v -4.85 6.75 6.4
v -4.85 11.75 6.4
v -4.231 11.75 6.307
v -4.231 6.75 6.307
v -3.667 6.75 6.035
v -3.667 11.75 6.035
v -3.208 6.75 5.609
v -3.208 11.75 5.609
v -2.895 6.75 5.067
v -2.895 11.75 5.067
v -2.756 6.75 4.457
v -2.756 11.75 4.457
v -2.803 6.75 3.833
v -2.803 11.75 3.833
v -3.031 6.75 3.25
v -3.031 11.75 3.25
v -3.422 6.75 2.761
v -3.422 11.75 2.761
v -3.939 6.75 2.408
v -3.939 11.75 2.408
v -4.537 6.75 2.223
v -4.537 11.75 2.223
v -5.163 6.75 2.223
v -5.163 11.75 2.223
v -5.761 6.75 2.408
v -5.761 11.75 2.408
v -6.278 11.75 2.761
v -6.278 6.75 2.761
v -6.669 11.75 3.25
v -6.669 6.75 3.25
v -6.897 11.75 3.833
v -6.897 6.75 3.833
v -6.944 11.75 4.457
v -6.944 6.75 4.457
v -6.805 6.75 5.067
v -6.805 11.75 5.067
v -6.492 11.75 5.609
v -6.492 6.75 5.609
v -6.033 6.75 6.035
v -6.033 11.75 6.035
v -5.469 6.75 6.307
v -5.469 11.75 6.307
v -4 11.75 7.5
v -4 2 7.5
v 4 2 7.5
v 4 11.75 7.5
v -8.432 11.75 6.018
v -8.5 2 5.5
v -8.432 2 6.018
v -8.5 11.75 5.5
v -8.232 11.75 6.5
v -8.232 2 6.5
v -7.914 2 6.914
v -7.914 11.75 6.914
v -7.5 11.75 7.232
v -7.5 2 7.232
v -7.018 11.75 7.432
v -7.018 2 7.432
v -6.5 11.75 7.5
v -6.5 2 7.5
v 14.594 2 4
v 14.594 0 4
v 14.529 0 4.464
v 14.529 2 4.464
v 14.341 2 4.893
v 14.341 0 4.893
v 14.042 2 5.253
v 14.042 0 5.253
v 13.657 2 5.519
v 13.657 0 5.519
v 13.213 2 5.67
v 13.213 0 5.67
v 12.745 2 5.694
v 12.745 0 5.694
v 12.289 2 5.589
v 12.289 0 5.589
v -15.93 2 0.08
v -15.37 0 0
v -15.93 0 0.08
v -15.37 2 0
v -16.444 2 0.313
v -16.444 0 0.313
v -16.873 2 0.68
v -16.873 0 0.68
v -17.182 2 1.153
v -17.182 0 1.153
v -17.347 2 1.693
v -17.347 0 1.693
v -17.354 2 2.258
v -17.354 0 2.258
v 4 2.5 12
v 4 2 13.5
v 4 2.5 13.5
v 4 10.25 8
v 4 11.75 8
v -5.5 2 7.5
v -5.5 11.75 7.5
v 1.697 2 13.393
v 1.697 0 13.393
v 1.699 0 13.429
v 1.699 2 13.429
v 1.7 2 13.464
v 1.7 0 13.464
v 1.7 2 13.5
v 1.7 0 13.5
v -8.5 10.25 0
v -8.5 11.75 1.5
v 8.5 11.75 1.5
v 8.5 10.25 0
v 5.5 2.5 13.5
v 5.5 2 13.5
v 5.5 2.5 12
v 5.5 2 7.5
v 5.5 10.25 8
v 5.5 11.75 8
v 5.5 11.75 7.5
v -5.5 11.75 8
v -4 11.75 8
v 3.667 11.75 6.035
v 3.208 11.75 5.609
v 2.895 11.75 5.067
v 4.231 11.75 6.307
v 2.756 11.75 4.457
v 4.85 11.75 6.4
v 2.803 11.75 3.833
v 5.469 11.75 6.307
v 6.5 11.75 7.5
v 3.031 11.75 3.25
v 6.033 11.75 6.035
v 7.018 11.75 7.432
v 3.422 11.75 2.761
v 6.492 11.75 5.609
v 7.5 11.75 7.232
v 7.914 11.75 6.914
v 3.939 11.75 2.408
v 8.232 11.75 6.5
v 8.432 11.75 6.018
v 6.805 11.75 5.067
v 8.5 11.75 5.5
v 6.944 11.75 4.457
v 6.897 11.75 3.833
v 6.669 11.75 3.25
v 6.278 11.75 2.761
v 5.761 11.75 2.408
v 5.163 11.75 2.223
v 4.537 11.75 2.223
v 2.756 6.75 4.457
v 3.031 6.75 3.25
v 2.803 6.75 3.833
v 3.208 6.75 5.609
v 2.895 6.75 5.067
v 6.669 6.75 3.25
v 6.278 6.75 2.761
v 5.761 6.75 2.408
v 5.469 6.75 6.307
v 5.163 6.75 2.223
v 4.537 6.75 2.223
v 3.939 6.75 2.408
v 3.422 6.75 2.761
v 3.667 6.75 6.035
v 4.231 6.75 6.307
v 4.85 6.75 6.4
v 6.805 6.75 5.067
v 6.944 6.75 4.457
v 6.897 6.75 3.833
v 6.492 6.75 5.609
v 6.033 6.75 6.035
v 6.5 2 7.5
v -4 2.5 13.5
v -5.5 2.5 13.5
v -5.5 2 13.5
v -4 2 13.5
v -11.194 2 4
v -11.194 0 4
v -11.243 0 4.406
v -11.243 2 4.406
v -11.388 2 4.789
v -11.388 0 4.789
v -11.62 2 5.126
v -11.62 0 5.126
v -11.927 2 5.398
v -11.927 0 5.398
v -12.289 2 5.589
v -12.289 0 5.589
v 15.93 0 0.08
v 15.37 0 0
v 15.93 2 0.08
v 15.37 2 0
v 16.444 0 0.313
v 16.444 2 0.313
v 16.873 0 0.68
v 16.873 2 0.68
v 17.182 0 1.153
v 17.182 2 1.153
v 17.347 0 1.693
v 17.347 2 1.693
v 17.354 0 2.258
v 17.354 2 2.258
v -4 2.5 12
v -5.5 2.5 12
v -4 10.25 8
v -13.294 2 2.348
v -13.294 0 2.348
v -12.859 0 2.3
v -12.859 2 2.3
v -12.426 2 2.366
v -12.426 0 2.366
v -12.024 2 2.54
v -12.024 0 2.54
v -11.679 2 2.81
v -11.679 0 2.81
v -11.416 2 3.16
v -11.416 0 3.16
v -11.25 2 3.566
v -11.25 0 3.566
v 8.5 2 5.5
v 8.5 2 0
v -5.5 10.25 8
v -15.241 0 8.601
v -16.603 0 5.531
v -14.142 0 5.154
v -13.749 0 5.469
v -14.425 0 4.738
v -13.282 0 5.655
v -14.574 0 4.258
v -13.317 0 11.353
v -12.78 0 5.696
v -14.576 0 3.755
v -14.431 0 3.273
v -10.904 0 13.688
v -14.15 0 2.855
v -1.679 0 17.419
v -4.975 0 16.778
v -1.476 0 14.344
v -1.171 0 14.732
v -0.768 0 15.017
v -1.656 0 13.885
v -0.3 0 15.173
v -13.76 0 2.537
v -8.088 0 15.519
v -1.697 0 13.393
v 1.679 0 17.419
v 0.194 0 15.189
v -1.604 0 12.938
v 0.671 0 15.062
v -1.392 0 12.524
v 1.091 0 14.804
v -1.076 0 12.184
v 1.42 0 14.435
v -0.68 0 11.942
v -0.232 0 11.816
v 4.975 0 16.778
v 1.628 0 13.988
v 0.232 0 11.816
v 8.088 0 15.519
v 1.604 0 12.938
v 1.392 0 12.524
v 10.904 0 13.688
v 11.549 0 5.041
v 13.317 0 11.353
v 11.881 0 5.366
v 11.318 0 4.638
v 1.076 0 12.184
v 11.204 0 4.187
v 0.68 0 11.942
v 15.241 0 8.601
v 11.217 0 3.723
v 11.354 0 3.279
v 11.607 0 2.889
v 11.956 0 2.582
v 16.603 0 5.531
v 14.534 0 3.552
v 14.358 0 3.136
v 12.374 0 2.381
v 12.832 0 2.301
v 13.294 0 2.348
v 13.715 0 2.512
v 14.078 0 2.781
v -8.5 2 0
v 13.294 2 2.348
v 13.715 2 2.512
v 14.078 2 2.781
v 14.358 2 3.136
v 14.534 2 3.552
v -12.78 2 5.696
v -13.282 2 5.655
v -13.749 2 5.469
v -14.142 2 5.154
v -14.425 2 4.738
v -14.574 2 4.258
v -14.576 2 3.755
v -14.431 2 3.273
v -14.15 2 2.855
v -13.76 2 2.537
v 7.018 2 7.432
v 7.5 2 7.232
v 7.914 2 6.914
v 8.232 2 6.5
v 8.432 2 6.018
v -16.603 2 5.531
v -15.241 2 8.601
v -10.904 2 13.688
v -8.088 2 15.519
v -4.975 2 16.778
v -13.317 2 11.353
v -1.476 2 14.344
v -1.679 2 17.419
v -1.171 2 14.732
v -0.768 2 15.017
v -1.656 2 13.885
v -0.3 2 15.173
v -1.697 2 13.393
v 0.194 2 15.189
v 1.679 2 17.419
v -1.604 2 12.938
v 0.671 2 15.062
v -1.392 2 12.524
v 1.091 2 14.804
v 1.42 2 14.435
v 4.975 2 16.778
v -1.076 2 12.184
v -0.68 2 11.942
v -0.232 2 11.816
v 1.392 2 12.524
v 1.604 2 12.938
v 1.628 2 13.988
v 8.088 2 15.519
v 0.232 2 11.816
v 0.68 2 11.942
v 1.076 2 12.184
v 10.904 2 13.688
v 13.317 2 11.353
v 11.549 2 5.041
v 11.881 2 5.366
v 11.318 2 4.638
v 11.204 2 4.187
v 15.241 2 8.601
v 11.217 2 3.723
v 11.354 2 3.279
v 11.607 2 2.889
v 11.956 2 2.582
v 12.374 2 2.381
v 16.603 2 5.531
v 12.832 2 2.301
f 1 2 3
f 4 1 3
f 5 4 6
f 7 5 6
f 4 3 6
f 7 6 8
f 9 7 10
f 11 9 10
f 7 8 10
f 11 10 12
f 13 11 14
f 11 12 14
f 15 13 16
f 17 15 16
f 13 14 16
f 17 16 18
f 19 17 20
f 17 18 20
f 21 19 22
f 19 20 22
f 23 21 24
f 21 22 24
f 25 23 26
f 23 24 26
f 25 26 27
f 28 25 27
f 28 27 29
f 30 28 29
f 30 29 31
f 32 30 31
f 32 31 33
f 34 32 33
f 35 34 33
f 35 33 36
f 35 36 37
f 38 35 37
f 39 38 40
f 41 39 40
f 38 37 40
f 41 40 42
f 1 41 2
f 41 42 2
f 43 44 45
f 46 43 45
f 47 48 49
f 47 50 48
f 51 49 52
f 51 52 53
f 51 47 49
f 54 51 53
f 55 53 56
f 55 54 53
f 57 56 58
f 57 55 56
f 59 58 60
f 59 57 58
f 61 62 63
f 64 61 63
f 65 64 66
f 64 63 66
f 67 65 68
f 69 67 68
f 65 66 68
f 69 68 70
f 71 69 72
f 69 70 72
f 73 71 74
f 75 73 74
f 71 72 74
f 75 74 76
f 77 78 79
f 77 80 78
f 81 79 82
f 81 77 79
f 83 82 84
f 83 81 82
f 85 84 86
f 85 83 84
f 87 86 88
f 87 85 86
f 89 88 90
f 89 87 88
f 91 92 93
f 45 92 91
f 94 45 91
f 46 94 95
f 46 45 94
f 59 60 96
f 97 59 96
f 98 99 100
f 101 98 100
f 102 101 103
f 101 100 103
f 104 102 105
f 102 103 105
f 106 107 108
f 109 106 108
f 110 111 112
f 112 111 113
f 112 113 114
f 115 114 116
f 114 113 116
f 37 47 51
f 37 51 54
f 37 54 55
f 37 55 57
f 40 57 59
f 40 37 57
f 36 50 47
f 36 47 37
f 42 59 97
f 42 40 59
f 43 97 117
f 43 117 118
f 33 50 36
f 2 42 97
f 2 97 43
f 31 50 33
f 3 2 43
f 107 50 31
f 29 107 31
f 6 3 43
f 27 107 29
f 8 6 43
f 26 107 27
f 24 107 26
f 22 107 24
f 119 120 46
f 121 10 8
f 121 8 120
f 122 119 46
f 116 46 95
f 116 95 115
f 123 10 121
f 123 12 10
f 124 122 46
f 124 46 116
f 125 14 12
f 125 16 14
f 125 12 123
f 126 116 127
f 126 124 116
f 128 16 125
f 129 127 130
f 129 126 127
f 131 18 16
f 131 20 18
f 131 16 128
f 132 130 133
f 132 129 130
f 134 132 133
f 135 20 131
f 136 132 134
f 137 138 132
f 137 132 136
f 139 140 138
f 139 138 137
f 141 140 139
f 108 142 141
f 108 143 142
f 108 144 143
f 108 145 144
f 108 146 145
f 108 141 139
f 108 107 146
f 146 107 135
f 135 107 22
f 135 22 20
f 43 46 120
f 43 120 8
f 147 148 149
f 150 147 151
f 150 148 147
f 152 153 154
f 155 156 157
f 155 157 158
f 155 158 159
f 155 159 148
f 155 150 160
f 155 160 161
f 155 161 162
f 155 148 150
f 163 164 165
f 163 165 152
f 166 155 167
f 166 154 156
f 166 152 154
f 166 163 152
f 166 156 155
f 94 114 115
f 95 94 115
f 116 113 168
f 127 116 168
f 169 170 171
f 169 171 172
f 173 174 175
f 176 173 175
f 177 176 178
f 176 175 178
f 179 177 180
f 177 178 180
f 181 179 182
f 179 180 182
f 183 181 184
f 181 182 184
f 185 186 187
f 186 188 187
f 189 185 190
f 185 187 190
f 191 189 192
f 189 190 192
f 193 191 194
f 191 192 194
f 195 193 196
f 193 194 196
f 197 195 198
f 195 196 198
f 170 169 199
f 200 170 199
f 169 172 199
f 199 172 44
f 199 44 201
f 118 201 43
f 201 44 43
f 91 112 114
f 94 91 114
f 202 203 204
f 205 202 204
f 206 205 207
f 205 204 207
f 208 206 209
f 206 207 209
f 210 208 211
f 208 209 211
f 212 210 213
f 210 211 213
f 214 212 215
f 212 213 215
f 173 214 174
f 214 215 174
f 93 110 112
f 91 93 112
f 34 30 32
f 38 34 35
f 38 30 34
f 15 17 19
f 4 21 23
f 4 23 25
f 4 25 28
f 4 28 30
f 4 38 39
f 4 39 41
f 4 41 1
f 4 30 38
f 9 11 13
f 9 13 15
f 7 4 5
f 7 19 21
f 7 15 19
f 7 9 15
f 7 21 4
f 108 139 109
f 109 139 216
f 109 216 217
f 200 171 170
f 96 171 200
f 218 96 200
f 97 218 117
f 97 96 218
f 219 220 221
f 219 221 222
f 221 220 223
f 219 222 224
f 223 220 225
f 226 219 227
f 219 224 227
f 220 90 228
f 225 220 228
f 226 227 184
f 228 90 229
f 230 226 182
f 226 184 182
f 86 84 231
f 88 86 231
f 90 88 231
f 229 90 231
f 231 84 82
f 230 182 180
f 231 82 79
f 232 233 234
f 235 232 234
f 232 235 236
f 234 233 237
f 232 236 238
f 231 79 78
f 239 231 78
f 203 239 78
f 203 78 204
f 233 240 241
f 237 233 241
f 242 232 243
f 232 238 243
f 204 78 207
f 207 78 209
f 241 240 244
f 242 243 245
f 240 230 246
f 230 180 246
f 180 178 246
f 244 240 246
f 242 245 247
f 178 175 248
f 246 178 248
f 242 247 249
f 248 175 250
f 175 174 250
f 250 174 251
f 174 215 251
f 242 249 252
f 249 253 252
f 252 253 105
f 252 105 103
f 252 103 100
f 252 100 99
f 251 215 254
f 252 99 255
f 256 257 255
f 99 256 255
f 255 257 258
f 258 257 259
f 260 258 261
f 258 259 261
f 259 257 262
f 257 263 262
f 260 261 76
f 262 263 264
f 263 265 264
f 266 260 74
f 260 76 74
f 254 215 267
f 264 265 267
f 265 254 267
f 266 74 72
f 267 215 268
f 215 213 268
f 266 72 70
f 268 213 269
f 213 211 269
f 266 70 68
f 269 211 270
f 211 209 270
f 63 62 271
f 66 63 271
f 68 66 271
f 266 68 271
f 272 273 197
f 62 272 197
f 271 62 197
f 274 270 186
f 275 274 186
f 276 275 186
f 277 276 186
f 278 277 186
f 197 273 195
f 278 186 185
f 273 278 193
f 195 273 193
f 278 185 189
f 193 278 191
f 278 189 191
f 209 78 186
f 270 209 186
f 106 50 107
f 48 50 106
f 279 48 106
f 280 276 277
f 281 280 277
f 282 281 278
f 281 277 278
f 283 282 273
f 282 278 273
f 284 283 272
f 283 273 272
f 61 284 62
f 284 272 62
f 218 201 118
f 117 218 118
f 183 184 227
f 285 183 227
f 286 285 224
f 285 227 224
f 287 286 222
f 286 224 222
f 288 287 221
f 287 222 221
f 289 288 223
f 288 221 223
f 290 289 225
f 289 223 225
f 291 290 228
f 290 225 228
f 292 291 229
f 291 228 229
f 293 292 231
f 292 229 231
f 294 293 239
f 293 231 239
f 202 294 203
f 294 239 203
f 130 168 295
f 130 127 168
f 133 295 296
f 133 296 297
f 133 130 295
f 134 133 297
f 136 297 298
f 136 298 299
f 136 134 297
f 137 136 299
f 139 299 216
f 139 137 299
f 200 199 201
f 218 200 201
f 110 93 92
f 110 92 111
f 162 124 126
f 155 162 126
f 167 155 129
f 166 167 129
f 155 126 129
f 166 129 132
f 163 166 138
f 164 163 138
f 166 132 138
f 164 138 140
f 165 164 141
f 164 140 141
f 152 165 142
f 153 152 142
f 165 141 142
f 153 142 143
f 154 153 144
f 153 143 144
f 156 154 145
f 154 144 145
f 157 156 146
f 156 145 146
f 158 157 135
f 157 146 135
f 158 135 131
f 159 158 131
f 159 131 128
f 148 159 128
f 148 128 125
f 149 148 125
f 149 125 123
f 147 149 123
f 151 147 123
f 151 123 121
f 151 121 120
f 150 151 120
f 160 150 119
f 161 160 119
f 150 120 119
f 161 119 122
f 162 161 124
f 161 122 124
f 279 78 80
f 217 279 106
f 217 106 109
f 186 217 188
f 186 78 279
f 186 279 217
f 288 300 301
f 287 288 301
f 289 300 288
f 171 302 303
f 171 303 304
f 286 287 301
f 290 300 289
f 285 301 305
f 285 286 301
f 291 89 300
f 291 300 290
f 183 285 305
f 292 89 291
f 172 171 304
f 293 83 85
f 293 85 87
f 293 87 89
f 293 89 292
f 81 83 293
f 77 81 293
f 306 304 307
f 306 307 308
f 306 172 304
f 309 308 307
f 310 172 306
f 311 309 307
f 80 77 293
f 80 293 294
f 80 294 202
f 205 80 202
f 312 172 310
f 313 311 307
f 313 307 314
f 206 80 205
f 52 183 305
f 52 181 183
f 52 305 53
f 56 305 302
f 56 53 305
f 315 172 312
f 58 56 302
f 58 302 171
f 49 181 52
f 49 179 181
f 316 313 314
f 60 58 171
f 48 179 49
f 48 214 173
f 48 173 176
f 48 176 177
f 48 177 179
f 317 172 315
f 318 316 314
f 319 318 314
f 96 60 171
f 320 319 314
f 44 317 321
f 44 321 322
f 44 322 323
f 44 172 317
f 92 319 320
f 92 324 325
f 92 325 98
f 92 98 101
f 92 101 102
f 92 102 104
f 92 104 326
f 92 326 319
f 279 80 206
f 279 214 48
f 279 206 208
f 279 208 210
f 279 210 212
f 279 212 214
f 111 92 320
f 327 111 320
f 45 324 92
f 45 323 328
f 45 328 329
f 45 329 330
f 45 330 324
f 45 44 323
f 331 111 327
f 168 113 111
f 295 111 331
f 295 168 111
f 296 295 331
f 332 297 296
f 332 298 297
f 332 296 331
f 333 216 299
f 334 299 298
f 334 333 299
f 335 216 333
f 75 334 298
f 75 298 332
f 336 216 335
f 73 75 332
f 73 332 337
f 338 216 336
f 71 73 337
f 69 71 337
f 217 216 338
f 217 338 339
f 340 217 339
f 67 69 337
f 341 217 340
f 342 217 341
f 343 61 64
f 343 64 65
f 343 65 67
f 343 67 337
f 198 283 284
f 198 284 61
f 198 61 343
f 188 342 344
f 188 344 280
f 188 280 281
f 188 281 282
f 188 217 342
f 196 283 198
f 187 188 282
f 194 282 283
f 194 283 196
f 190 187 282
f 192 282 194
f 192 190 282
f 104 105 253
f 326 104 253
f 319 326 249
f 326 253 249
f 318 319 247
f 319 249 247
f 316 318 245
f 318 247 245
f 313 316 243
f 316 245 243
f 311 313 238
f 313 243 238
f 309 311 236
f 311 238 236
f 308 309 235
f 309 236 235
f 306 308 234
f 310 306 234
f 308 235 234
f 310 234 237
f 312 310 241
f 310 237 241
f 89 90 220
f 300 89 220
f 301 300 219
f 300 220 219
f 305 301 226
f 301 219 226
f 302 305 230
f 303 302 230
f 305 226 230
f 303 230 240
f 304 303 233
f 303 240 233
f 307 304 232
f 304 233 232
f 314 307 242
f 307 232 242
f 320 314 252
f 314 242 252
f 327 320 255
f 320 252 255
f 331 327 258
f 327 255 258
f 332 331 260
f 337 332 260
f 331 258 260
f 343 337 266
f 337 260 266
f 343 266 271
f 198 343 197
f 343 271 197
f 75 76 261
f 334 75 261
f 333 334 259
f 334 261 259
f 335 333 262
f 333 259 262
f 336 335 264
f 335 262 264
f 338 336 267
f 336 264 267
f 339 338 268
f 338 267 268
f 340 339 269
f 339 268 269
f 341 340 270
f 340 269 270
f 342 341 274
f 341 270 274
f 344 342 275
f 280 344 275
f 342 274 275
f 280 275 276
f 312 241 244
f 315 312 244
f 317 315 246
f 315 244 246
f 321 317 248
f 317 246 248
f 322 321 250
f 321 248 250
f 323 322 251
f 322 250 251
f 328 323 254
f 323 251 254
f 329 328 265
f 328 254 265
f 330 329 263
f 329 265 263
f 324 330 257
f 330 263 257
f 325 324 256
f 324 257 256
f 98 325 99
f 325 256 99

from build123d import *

# Parameters (mm, degrees)
BOSS_EXTRUDE1_DEPTH = 2
SKETCH1_3_W         = 17
SKETCH1_3_H         = 7.5
SKETCH1_3_R         = 2.1
BOSS_EXTRUDE2_DEPTH = 11.75
FILLET1_R           = 2
CHAMFER1_SIZE       = 1.5
SKETCH2_W           = 1.5
SKETCH2_H           = 9.75
BOSS_EXTRUDE3_DEPTH = 6
CUT_EXTRUDE1_DEPTH  = 32.102554433
CUT_EXTRUDE2_START  = 11.75
SKETCH1_4_R         = 2.1
CUT_EXTRUDE2_DEPTH  = 5


with BuildPart() as part:
    # Sketch1 → Boss-Extrude1 (new body)
    with BuildSketch(Plane(origin=(0, 0, 0), x_dir=(1, 0, 0), z_dir=(0, 1, 0))):
        with BuildLine():
            ThreePointArc((13.294270592, -2.34784357), (13.448469299, -1.178419919), (13.5, 0))
            Line((13.5, 0), (8.5, 0))
            Line((8.5, 0), (8.5, -7.5))
            Line((8.5, -7.5), (-8.5, -7.5))
            Line((-8.5, -7.5), (-8.5, 0))
            Line((-8.5, 0), (-13.5, 0))
            ThreePointArc((-13.5, 0), (-13.448469299, -1.178419919), (-13.294270592, -2.34784357))
            ThreePointArc((-13.294270592, -2.34784357), (-11.842798665, -2.663810422), (-11.193796958, -4))
            ThreePointArc((-11.193796958, -4), (-11.494084595, -4.964782515), (-12.288862018, -5.588727075))
            ThreePointArc((-12.288862018, -5.588727075), (-8.007808689, -10.86853256), (-1.696626969, -13.392962963))
            ThreePointArc((-1.696626969, -13.392962963), (0, -11.8), (1.696626969, -13.392962963))
            ThreePointArc((1.696626969, -13.392962963), (8.007808689, -10.86853256), (12.288862018, -5.588727075))
            ThreePointArc((12.288862018, -5.588727075), (11.270133638, -3.496296296), (13.294270592, -2.34784357))
        make_face()
        with BuildLine():
            Line((17.5, 0), (13.5, 0))
            ThreePointArc((13.5, 0), (13.448469299, -1.178419919), (13.294270592, -2.34784357))
            ThreePointArc((13.294270592, -2.34784357), (14.229986536, -2.949001707), (14.593796958, -4))
            ThreePointArc((14.593796958, -4), (13.858579473, -5.399712363), (12.288862018, -5.588727075))
            ThreePointArc((12.288862018, -5.588727075), (8.007808689, -10.86853256), (1.696626969, -13.392962963))
            ThreePointArc((1.696626969, -13.392962963), (1.699156533, -13.446454915), (1.7, -13.5))
            ThreePointArc((1.7, -13.5), (-0.053545085, -15.199156533), (-1.696626969, -13.392962963))
            ThreePointArc((-1.696626969, -13.392962963), (-8.007808689, -10.86853256), (-12.288862018, -5.588727075))
            ThreePointArc((-12.288862018, -5.588727075), (-14.517460279, -4.503703704), (-13.294270592, -2.34784357))
            ThreePointArc((-13.294270592, -2.34784357), (-13.448469299, -1.178419919), (-13.5, 0))
            Line((-13.5, 0), (-17.5, 0))
            ThreePointArc((-17.5, 0), (0, -17.5), (17.5, 0))
        make_face()
    extrude(amount=BOSS_EXTRUDE1_DEPTH)

    # Sketch1<3> → Boss-Extrude2 (add)
    # profile 1 of 3: a face of its own
    with BuildSketch(Plane(origin=(0, 0, 0), x_dir=(1, 0, 0), z_dir=(0, 1, 0))):
        with Locations((0, -3.75)):
            Rectangle(SKETCH1_3_W, SKETCH1_3_H)
        with Locations((-4.85, -4.3)):
            Circle(SKETCH1_3_R, mode=Mode.SUBTRACT)
        with Locations((4.85, -4.3)):
            Circle(SKETCH1_3_R, mode=Mode.SUBTRACT)
    # profile 2 of 3: a face of its own
    with BuildSketch(Plane(origin=(0, 0, 0), x_dir=(1, 0, 0), z_dir=(0, 1, 0))):
        with Locations((-4.85, -4.3)):
            Circle(SKETCH1_3_R)
    # profile 3 of 3: a face of its own
    with BuildSketch(Plane(origin=(0, 0, 0), x_dir=(1, 0, 0), z_dir=(0, 1, 0))):
        with Locations((4.85, -4.3)):
            Circle(SKETCH1_3_R)
    extrude(amount=BOSS_EXTRUDE2_DEPTH)

    # Fillet1
    fillet1_edges = [part.edges().sort_by_distance(p)[0] for p in [
        (-17.5, 1, 0),
        (17.5, 1, 0),
        (8.5, 6.875, 7.5),
        (-8.5, 6.875, 7.5),
    ]]
    fillet(fillet1_edges, radius=FILLET1_R)

    # Chamfer1
    chamfer1_edges = [part.edges().sort_by_distance(p)[0] for p in [
        (0, 11.75, 0),
    ]]
    chamfer(chamfer1_edges, length=CHAMFER1_SIZE)

    # Sketch2 → Boss-Extrude3 (add)
    with BuildSketch(Plane.XY.offset(7.5)):
        with Locations((-4.75, 6.875)):
            Rectangle(SKETCH2_W, SKETCH2_H)
        with Locations((4.75, 6.875)):
            Rectangle(SKETCH2_W, SKETCH2_H)
    extrude(amount=BOSS_EXTRUDE3_DEPTH)

    # Sketch3 → Cut-Extrude1 (cut, through all)
    with BuildSketch(Plane(origin=(5.5, 0, 0), x_dir=(0, 0, -1), z_dir=(1, 0, 0))):
        Polygon((-8, 10.25), (-8, 11.75), (-13.5, 11.75), (-13.5, 2.5), (-12, 2.5), align=None)
    extrude(amount=-CUT_EXTRUDE1_DEPTH, mode=Mode.SUBTRACT)

    # Sketch1<4> → Cut-Extrude2 (cut)
    with BuildSketch(Plane(origin=(0, 0, 0), x_dir=(1, 0, 0), z_dir=(0, 1, 0)).offset(CUT_EXTRUDE2_START)):
        with Locations(Location((-4.85, -4.3, 0), (0, 0, 270))):
            Circle(SKETCH1_4_R)
        with Locations(Location((4.85, -4.3, 0), (0, 0, 270))):
            Circle(SKETCH1_4_R)
    extrude(amount=-CUT_EXTRUDE2_DEPTH, mode=Mode.SUBTRACT)


solid = part.part
